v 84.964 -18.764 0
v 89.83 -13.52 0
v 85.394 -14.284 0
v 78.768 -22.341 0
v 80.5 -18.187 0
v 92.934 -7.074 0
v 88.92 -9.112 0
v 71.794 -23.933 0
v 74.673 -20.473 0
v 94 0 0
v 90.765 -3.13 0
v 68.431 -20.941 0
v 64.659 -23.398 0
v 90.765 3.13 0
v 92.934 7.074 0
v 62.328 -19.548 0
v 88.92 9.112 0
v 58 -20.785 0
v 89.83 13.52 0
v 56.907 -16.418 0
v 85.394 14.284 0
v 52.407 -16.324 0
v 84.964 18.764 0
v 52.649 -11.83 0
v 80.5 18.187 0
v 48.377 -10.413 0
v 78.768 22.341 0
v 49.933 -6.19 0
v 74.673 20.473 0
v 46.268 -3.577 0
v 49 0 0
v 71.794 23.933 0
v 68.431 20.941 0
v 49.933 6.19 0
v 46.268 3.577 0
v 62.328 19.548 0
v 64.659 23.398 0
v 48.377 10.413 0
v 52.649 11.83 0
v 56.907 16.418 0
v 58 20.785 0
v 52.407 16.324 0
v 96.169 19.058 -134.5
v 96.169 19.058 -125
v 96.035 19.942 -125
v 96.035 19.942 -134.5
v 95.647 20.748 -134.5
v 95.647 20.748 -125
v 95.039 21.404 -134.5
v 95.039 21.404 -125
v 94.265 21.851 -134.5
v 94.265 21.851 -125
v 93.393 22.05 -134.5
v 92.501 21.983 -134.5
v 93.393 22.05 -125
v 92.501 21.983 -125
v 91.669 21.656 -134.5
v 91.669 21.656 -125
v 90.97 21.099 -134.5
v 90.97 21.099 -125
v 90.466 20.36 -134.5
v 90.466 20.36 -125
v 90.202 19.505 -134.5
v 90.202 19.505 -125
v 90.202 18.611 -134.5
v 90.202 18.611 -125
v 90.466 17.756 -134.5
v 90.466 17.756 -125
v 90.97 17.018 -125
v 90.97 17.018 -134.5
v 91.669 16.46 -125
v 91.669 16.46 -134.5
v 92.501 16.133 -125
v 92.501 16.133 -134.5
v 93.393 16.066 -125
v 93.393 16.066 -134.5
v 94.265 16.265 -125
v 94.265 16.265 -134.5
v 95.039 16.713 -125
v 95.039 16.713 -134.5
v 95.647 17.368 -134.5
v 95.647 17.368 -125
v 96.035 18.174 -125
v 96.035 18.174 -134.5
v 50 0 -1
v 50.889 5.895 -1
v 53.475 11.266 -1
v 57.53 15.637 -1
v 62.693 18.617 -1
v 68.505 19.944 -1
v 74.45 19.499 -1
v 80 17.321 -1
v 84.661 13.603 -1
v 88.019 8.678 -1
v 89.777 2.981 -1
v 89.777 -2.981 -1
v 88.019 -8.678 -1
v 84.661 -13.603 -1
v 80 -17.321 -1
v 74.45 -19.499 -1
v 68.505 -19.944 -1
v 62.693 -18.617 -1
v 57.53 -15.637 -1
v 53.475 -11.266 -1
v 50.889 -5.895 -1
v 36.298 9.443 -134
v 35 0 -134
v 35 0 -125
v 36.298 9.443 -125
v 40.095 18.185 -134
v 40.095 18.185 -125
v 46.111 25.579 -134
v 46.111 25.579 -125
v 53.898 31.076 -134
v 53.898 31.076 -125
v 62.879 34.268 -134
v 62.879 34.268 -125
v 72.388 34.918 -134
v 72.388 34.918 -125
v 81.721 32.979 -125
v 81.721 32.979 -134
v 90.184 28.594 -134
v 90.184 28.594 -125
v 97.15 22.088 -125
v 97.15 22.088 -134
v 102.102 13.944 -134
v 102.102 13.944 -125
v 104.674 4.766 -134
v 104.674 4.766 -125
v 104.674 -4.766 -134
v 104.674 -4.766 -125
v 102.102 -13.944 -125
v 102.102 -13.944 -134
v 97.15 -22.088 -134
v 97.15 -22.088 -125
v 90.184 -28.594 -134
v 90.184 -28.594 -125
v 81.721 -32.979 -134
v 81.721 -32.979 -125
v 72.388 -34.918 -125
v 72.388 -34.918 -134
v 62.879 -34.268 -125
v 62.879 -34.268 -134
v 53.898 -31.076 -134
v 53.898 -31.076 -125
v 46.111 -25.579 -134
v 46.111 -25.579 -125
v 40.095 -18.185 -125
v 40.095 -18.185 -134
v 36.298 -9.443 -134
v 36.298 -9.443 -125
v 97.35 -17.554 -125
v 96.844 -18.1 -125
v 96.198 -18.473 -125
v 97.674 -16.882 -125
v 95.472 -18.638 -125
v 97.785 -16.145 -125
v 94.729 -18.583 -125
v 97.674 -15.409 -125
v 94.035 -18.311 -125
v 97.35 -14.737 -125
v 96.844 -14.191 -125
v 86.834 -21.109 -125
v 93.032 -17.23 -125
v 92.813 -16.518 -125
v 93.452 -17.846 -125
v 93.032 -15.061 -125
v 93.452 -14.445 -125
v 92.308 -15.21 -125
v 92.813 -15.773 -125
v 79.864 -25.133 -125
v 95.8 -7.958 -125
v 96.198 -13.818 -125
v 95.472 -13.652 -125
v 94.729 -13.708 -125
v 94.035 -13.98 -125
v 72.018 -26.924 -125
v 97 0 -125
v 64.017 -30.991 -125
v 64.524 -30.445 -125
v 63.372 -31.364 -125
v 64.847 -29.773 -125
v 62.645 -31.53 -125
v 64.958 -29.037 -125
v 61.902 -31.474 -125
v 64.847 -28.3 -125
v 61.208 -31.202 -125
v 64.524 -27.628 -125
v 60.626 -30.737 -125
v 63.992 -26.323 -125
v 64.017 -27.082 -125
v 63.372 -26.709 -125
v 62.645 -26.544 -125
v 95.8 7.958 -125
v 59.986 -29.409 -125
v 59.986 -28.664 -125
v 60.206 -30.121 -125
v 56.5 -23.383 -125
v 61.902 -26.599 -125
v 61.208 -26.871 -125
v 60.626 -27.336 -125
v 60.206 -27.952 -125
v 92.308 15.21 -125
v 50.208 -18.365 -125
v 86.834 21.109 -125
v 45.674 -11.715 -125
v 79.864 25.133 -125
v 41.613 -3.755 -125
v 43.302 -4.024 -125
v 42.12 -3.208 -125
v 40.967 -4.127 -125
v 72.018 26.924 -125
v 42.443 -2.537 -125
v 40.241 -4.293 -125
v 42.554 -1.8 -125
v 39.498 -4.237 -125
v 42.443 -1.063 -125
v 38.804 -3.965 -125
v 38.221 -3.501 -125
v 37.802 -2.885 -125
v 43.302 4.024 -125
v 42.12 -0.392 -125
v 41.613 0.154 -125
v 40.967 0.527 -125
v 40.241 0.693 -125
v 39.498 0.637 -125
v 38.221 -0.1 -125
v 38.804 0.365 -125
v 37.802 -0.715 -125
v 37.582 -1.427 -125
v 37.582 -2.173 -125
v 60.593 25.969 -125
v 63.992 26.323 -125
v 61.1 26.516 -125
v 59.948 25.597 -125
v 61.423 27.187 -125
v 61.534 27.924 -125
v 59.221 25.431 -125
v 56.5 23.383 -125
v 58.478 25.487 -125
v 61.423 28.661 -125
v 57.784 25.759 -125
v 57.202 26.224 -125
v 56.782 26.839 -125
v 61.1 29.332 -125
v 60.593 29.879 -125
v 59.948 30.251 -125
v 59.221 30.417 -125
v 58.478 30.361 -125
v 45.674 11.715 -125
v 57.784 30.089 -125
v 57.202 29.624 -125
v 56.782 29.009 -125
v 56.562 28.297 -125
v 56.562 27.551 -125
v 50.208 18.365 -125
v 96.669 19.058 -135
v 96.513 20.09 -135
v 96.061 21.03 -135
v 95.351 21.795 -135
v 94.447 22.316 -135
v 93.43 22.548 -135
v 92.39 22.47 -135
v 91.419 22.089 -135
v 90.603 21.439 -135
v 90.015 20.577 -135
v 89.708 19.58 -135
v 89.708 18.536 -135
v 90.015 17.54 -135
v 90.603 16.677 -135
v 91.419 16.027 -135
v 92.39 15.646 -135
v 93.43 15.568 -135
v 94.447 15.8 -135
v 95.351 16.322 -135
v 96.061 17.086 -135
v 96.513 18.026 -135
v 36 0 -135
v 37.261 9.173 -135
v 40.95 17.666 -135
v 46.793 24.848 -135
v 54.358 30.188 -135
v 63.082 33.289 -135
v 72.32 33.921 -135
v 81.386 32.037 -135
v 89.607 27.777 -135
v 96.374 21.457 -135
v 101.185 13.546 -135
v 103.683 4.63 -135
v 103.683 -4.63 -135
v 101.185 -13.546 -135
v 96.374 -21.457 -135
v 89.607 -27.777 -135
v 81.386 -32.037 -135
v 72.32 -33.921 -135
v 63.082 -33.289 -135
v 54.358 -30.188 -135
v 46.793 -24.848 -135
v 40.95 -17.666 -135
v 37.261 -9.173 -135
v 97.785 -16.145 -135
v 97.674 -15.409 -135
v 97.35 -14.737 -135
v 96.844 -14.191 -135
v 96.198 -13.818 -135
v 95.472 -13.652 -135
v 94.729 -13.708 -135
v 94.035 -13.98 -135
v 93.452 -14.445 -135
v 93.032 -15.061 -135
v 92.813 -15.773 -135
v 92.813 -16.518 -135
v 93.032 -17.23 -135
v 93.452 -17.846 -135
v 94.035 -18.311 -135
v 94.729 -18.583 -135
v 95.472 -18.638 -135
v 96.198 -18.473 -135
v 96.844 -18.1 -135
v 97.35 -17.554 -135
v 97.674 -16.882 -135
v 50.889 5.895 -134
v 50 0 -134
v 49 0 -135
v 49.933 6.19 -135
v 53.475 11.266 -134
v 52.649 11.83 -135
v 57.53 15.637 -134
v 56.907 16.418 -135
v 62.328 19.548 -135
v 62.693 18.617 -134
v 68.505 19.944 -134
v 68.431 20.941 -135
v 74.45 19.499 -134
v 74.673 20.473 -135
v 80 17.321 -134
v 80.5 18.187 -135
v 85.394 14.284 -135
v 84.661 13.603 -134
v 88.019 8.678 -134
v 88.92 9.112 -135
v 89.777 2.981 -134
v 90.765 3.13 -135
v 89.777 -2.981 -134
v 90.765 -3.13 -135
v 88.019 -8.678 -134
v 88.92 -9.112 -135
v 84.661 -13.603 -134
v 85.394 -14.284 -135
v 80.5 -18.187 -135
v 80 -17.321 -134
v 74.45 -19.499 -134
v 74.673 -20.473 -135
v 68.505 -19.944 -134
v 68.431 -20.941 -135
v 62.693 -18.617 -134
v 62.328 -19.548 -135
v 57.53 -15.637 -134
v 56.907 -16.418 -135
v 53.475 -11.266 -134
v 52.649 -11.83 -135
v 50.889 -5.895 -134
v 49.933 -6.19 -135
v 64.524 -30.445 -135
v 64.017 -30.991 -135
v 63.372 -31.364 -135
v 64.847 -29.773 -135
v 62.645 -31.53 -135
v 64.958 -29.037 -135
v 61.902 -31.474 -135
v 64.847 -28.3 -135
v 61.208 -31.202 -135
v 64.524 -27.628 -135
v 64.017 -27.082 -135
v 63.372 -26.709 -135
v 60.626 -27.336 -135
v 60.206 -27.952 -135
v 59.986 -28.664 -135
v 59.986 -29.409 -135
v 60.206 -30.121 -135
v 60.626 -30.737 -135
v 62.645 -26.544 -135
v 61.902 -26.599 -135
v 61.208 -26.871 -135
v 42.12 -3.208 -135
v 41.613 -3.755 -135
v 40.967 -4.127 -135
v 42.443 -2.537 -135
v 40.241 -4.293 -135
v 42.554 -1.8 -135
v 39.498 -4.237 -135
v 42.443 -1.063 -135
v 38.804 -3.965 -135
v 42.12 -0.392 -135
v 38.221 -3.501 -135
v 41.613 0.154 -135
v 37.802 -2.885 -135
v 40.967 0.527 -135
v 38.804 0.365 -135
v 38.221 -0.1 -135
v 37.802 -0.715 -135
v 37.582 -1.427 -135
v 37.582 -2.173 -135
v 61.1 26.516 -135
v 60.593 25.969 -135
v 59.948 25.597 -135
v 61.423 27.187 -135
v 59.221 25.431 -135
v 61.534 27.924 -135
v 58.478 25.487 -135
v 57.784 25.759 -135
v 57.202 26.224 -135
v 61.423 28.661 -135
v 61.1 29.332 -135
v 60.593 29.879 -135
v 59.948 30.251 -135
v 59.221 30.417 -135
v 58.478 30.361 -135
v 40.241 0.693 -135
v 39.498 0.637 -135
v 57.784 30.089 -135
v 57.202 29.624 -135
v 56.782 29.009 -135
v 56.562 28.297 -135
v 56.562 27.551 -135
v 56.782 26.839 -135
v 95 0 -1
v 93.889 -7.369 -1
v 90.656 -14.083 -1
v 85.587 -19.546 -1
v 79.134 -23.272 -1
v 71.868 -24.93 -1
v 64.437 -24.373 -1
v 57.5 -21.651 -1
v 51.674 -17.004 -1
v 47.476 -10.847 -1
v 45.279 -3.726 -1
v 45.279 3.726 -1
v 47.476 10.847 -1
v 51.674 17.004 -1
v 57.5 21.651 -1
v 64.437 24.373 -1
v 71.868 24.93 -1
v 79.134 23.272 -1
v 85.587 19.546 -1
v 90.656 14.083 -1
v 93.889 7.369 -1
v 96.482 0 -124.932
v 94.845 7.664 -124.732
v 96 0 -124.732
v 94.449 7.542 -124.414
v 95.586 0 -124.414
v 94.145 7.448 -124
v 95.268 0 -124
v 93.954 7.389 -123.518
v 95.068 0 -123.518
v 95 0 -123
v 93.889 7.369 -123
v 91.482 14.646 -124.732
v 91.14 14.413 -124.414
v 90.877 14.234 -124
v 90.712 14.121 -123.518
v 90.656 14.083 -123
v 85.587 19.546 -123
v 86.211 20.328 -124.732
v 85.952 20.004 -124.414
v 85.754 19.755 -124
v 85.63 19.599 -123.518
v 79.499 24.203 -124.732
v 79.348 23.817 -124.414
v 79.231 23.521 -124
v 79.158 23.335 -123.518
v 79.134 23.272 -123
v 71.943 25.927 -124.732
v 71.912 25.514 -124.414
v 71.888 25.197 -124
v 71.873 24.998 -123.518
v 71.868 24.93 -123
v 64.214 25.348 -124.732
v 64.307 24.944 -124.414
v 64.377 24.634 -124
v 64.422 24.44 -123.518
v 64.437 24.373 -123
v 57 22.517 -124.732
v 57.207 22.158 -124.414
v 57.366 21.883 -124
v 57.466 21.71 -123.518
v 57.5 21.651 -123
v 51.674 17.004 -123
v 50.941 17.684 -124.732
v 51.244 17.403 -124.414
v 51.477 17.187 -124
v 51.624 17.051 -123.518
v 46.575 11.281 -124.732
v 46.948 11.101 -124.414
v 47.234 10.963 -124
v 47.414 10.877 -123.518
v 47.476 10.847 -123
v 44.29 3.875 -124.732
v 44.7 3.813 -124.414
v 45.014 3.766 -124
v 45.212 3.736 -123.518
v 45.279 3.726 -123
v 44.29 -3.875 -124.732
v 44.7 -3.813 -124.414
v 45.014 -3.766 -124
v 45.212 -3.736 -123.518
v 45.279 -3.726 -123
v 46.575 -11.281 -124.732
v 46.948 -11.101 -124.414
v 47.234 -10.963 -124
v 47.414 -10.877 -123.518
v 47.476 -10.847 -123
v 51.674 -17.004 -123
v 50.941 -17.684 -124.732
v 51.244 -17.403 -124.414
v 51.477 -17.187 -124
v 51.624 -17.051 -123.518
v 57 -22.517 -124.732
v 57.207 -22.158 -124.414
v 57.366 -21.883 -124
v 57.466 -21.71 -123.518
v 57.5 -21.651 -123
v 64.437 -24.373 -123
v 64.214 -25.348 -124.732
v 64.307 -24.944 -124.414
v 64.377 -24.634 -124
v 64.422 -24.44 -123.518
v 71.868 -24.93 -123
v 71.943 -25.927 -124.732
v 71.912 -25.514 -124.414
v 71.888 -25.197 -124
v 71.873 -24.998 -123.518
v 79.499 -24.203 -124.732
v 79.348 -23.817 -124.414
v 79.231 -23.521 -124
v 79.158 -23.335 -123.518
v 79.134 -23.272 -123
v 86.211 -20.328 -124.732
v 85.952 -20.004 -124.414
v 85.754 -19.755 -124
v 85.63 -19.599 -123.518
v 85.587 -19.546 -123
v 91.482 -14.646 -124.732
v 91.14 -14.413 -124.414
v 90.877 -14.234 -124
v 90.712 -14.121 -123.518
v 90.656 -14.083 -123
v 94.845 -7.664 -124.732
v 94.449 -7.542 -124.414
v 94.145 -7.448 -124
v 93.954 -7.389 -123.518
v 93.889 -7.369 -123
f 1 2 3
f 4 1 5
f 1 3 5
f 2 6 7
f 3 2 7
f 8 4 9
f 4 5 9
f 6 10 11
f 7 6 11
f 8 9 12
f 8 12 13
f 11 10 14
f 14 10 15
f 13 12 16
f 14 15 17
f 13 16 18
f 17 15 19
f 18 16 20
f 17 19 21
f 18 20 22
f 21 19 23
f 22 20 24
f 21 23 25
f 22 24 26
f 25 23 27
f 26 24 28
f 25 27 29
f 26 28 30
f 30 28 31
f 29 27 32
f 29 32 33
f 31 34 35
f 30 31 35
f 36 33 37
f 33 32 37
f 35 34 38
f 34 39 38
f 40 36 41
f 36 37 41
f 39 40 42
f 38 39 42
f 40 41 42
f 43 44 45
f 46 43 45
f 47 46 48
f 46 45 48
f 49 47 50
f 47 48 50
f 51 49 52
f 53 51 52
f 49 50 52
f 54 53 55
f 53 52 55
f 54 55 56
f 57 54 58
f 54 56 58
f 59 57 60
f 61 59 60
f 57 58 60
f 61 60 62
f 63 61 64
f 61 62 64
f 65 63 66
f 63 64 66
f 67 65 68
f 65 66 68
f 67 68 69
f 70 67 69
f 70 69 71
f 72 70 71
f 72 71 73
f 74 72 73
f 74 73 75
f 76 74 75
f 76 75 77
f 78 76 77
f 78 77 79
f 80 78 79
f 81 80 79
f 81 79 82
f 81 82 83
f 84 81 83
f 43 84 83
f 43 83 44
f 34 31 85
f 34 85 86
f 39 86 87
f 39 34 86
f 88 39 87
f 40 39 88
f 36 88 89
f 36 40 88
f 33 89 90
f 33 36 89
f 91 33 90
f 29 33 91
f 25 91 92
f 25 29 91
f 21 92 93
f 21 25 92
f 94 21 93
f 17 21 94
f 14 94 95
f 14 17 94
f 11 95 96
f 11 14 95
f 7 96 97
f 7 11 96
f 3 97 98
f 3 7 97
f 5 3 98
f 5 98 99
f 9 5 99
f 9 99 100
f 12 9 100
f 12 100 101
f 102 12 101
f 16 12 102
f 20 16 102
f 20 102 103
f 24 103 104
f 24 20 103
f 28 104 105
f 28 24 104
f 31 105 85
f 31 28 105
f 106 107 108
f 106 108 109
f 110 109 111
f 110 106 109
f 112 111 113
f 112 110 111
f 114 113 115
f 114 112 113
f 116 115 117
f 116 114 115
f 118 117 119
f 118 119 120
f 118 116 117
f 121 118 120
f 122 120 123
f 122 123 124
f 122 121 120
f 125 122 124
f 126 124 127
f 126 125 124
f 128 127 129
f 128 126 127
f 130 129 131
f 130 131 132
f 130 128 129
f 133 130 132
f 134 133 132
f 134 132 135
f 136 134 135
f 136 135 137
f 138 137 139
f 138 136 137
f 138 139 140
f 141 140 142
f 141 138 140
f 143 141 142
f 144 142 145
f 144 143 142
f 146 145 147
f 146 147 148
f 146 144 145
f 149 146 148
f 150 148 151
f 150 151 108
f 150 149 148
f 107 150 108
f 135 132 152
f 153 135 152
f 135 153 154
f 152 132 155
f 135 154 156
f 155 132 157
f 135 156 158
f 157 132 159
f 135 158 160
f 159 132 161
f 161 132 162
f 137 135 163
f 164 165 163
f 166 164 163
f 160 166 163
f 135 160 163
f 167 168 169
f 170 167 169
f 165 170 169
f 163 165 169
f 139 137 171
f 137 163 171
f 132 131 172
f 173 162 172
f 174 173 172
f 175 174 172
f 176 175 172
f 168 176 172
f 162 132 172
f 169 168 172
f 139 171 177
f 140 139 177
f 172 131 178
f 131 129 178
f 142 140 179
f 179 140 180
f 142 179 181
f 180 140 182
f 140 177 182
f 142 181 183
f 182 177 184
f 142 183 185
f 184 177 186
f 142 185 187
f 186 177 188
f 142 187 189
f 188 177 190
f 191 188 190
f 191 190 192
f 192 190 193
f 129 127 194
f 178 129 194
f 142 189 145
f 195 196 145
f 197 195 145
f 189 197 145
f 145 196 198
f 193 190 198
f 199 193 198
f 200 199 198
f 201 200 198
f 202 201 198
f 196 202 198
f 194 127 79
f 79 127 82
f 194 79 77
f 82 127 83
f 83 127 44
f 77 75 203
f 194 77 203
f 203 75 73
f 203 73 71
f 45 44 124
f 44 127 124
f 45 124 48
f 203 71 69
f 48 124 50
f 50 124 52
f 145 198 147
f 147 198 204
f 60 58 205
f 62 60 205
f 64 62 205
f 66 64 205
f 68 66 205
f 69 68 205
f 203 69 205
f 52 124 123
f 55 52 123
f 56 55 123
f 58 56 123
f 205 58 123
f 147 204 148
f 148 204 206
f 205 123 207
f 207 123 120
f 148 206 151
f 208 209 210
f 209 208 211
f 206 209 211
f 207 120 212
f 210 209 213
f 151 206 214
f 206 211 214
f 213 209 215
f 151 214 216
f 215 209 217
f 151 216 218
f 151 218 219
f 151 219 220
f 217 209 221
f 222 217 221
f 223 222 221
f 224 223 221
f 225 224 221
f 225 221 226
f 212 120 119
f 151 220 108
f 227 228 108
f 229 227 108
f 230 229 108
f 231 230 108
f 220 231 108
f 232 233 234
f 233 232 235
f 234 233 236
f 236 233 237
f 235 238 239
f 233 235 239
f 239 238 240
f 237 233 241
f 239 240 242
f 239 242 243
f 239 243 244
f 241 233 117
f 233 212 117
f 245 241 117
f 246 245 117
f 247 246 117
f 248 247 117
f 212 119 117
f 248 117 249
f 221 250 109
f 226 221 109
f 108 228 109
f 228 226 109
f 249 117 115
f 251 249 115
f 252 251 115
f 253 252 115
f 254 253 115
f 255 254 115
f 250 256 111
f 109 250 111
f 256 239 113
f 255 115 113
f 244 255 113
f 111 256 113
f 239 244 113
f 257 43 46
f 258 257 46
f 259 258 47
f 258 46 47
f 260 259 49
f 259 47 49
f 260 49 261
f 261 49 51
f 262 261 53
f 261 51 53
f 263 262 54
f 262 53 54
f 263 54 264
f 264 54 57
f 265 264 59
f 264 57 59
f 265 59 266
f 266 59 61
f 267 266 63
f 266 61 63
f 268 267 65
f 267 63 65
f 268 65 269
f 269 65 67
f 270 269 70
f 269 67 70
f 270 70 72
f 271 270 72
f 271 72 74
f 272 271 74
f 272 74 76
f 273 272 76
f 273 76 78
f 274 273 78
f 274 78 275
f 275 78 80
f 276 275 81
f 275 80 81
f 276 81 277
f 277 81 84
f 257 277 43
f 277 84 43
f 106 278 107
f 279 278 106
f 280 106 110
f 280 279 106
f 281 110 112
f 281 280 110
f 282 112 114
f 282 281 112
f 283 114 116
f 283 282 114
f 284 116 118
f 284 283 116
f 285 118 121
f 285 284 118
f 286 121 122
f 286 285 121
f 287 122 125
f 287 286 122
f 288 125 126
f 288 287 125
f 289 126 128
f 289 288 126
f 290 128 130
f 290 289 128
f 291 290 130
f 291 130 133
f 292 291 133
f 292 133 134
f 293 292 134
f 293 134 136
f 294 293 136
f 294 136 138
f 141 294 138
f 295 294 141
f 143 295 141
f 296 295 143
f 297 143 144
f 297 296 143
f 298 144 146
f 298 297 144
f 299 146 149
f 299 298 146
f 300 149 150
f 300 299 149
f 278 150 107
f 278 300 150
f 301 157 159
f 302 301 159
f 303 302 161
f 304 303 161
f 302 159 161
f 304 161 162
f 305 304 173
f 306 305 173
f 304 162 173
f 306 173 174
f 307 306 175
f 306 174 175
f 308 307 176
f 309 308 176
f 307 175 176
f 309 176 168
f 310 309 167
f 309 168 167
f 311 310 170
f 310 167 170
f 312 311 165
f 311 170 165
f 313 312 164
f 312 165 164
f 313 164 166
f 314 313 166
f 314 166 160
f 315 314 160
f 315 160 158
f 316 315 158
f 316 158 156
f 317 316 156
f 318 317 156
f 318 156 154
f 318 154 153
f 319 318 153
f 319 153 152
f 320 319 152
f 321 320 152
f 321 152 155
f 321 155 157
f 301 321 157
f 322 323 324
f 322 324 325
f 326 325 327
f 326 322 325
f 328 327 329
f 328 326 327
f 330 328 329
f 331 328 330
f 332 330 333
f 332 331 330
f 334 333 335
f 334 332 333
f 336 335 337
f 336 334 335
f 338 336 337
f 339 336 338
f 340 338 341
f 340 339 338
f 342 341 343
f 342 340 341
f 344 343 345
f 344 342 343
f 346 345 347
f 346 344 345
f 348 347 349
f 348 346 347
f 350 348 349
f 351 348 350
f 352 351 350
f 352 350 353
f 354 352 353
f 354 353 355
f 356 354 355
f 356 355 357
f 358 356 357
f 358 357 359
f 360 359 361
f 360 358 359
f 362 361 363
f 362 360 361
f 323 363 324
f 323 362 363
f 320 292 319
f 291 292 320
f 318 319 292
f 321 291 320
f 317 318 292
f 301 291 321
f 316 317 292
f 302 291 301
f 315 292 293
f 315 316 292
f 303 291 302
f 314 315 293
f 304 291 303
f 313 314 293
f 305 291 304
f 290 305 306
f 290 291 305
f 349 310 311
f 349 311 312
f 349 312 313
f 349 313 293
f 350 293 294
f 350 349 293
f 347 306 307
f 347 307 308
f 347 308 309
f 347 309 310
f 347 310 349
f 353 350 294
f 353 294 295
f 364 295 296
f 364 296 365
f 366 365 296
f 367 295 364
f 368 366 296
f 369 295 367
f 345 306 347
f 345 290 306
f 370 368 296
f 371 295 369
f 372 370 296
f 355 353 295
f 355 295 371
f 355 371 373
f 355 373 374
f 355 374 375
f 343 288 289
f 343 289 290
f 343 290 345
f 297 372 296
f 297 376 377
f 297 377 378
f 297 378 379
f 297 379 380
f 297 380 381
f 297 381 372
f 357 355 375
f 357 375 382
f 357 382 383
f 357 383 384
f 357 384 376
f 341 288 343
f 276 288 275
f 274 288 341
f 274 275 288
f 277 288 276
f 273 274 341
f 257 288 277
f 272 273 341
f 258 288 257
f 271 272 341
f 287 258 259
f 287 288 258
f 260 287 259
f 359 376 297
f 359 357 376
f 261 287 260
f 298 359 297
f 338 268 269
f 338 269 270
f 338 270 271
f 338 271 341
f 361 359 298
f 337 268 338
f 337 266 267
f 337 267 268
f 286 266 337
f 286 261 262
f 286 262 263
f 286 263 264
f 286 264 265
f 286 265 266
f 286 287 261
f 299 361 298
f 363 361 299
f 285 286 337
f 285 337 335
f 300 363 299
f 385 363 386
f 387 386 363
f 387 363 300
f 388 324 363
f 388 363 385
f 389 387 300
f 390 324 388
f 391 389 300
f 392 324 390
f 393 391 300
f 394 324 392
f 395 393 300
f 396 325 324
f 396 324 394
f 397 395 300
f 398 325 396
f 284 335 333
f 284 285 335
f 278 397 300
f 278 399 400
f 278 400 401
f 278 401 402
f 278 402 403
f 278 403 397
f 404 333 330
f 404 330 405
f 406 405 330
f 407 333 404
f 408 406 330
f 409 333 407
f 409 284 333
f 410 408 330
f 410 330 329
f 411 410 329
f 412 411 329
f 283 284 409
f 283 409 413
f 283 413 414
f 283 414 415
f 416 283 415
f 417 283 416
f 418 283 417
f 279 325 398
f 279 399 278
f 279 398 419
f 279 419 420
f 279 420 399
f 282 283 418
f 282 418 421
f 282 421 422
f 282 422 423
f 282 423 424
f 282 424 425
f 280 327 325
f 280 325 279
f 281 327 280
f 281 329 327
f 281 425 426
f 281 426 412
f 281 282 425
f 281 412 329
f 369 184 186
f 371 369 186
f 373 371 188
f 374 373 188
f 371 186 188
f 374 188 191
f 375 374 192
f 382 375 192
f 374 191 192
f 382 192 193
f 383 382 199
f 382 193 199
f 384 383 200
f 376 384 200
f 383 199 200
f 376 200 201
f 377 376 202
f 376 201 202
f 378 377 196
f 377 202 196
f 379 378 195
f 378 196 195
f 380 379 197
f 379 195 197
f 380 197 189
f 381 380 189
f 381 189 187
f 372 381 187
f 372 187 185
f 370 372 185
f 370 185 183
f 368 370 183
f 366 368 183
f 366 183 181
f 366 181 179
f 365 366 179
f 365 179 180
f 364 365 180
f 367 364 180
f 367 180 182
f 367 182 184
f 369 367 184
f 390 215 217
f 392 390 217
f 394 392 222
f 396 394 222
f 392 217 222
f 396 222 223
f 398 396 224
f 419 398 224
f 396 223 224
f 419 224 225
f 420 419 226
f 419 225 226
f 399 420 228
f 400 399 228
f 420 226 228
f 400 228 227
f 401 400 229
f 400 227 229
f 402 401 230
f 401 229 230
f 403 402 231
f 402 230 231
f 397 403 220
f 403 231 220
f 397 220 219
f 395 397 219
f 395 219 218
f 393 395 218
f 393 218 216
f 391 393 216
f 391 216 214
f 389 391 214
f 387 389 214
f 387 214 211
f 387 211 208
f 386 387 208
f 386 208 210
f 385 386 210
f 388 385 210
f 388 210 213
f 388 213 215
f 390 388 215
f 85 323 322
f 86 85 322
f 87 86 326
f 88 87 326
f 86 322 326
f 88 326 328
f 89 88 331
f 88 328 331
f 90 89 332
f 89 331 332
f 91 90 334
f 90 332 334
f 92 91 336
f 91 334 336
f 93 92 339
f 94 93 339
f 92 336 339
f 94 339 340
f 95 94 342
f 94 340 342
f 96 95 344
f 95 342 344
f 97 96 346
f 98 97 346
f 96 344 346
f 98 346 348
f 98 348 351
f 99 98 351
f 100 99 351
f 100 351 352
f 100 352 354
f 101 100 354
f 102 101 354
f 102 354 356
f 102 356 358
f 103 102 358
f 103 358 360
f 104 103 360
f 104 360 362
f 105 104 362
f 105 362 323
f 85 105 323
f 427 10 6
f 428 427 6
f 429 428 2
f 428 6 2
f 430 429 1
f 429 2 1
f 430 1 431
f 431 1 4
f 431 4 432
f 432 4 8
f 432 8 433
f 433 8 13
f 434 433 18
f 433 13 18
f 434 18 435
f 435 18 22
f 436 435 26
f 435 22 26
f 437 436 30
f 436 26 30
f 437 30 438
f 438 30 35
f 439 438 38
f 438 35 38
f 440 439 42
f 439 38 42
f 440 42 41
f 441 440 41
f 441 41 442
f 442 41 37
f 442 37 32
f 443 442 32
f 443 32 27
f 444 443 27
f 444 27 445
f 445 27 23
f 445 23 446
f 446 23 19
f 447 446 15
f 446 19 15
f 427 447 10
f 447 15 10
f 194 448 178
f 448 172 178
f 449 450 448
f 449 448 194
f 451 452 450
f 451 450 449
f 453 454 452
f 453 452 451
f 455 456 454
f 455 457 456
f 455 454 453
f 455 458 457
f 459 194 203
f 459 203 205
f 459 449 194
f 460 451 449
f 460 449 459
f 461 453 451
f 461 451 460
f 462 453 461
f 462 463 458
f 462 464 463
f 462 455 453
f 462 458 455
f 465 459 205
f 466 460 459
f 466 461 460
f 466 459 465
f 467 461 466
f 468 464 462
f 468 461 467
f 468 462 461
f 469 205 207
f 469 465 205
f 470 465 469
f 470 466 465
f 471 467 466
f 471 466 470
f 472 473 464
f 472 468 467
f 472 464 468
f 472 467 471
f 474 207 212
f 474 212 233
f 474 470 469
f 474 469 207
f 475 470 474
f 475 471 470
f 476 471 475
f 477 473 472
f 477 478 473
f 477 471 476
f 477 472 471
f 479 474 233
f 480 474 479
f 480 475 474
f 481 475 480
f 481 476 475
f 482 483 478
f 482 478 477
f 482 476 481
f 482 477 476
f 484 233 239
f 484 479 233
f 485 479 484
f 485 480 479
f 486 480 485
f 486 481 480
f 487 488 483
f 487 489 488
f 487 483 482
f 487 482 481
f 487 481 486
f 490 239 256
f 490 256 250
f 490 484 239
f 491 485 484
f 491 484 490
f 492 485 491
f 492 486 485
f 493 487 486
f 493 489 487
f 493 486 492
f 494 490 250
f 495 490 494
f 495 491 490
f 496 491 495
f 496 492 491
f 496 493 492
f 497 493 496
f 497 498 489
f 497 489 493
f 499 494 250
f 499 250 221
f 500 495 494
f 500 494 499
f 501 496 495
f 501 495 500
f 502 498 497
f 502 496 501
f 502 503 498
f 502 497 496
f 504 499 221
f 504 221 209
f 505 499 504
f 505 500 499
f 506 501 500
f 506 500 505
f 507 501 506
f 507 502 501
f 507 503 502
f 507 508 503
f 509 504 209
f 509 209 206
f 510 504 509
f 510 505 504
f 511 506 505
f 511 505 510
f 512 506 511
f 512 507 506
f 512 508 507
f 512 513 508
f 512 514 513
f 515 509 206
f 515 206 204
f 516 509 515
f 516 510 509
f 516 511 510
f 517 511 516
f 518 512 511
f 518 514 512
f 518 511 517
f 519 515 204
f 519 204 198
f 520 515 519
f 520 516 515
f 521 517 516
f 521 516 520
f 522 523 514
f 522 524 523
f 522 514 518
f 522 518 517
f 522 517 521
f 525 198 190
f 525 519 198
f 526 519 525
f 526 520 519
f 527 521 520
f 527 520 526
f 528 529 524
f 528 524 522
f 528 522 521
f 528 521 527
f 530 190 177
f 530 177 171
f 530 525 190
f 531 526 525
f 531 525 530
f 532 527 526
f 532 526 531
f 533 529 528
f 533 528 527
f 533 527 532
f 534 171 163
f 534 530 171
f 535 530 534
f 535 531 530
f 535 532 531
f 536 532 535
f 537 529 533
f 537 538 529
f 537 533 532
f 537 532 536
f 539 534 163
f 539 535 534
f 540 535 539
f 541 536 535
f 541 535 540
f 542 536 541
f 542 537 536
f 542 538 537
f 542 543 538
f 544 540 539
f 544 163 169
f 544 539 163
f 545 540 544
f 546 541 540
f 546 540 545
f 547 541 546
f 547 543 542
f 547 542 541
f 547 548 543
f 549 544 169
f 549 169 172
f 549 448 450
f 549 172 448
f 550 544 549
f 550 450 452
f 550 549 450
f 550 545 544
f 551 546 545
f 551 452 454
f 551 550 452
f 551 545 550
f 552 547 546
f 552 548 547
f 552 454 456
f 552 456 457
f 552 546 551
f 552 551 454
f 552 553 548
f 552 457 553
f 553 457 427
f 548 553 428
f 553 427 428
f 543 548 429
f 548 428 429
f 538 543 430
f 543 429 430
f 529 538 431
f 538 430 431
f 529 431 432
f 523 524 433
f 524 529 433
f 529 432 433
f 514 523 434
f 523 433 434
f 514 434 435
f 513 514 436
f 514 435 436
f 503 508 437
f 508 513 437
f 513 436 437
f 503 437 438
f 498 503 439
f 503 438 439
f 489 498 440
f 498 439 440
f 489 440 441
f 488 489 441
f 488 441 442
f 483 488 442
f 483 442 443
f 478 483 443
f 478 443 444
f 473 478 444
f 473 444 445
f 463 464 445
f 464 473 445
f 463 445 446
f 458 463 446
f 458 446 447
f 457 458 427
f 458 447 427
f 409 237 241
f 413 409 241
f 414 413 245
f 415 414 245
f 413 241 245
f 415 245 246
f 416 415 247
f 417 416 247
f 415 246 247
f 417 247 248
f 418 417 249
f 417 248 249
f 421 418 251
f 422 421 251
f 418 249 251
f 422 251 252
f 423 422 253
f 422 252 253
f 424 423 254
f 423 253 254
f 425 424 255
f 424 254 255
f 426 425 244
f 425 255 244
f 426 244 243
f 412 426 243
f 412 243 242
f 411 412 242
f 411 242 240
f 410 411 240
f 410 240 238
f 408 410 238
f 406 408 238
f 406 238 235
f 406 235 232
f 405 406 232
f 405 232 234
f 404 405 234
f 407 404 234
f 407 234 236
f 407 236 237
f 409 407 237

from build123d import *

# Parameters (mm, degrees)
SKETCH_1_R                = 35
EXTRUDE_1_DEPTH           = 5
SKETCH_2_R                = 25
EXTRUDE_2_DEPTH           = 135
SKETCH_4_R                = 35
CUT_EXTRUDE_2_DEPTH       = 5
SKETCH_9_R                = 35
EXTRUDE_3_DEPTH           = 10
CHAMFER_1_SIZE            = 1
HOLE_WIZARD_M6_1_D        = 5
HOLE_WIZARD_M6_1_DEPTH    = 25
HOLE_WIZARD_M6_1_TIP      = 1.502151548
HOLE_WIZARD_6_0_6_1_D     = 6
HOLE_WIZARD_6_0_6_1_DEPTH = 20
HOLE_WIZARD_6_0_6_1_TIP   = 1.802581857
CHAMFER_2_SIZE            = 0.5
SKETCH_10_R               = 20
CUT_EXTRUDE_3_DEPTH       = 175.570902501
FILLET_1_R                = 2
CHAMFER_3_SIZE            = 1


with BuildPart() as part:
    # 草图1 → 凸台-拉伸1 (new body)
    with BuildSketch(Plane.XY):
        with Locations((70, 0)):
            Circle(SKETCH_1_R)
    extrude(amount=EXTRUDE_1_DEPTH)

    # 草图2 → 凸台-拉伸2 (add)
    with BuildSketch(Plane(origin=(0, 0, 0), x_dir=(-1, 0, 0), z_dir=(0, 0, -1))):
        with Locations(Location((-70, 0, 0), (0, 0, 180))):
            Circle(SKETCH_2_R)
    extrude(amount=EXTRUDE_2_DEPTH)

    # 草图4 → 切除-拉伸2 (cut)
    with BuildSketch(Plane(origin=(0, 0, 0), x_dir=(-1, 0, 0), z_dir=(0, 0, -1))):
        with Locations((-70, 0)):
            Circle(SKETCH_4_R)
    extrude(amount=-CUT_EXTRUDE_2_DEPTH, mode=Mode.SUBTRACT)

    # 草图9 → 凸台-拉伸3 (add)
    with BuildSketch(Plane(origin=(0, 0, -135), x_dir=(-1, 0, 0), z_dir=(0, 0, -1))):
        with Locations((-70, 0)):
            Circle(SKETCH_9_R)
    extrude(amount=-EXTRUDE_3_DEPTH)

    # 倒角1
    chamfer_1_edges = [part.edges().sort_by_distance(p)[0] for p in [
        (105, 0, -135),
        (45, 0, 0),
    ]]
    chamfer(chamfer_1_edges, length=CHAMFER_1_SIZE)

    # M6 螺纹孔1
    with Locations(Plane(origin=(0, 0, -135), x_dir=(-1, 0, 0), z_dir=(0, 0, -1))):
        with Locations((-62.458195458, -29.036549111), (-95.284853471, -16.145469487), (-59.034192698, 27.924023174), (-40.054054986, -1.800104779)):
            Hole(HOLE_WIZARD_M6_1_D / 2, depth=HOLE_WIZARD_M6_1_DEPTH)
            with Locations((0, 0, -(HOLE_WIZARD_M6_1_DEPTH + HOLE_WIZARD_M6_1_TIP / 2))):  # 118° drill point
                Cone(0, HOLE_WIZARD_M6_1_D / 2, HOLE_WIZARD_M6_1_TIP, mode=Mode.SUBTRACT)

    # Ø6.0 (6) 直径孔1
    with Locations(Plane(origin=(0, 0, -135), x_dir=(-1, 0, 0), z_dir=(0, 0, -1))):
        with Locations((-93.168703387, 19.058100203)):
            Hole(HOLE_WIZARD_6_0_6_1_D / 2, depth=HOLE_WIZARD_6_0_6_1_DEPTH)
            with Locations((0, 0, -(HOLE_WIZARD_6_0_6_1_DEPTH + HOLE_WIZARD_6_0_6_1_TIP / 2))):  # 118° drill point
                Cone(0, HOLE_WIZARD_6_0_6_1_D / 2, HOLE_WIZARD_6_0_6_1_TIP, mode=Mode.SUBTRACT)

    # 倒角2
    chamfer_2_edges = [part.edges().sort_by_distance(p)[0] for p in [
        (90.168703387, 19.058100203, -135),
    ]]
    chamfer(chamfer_2_edges, length=CHAMFER_2_SIZE)

    # 草图10 → 切除-拉伸3 (cut, through all)
    with BuildSketch(Plane(origin=(0, 0, -135), x_dir=(-1, 0, 0), z_dir=(0, 0, -1))):
        with Locations((-70, 0)):
            Circle(SKETCH_10_R)
    extrude(amount=-CUT_EXTRUDE_3_DEPTH, mode=Mode.SUBTRACT)

    # 圆角1
    fillet_1_edges = [part.edges().sort_by_distance(p)[0] for p in [
        (45, 0, -125),
    ]]
    fillet(fillet_1_edges, radius=FILLET_1_R - 0.0001)  # a hair under: the kernel refuses the full size

    # 倒角3
    chamfer_3_edges = [part.edges().sort_by_distance(p)[0] for p in [
        (90, 0, 0),
        (90, 0, -135),
    ]]
    chamfer(chamfer_3_edges, length=CHAMFER_3_SIZE)


solid = part.part
